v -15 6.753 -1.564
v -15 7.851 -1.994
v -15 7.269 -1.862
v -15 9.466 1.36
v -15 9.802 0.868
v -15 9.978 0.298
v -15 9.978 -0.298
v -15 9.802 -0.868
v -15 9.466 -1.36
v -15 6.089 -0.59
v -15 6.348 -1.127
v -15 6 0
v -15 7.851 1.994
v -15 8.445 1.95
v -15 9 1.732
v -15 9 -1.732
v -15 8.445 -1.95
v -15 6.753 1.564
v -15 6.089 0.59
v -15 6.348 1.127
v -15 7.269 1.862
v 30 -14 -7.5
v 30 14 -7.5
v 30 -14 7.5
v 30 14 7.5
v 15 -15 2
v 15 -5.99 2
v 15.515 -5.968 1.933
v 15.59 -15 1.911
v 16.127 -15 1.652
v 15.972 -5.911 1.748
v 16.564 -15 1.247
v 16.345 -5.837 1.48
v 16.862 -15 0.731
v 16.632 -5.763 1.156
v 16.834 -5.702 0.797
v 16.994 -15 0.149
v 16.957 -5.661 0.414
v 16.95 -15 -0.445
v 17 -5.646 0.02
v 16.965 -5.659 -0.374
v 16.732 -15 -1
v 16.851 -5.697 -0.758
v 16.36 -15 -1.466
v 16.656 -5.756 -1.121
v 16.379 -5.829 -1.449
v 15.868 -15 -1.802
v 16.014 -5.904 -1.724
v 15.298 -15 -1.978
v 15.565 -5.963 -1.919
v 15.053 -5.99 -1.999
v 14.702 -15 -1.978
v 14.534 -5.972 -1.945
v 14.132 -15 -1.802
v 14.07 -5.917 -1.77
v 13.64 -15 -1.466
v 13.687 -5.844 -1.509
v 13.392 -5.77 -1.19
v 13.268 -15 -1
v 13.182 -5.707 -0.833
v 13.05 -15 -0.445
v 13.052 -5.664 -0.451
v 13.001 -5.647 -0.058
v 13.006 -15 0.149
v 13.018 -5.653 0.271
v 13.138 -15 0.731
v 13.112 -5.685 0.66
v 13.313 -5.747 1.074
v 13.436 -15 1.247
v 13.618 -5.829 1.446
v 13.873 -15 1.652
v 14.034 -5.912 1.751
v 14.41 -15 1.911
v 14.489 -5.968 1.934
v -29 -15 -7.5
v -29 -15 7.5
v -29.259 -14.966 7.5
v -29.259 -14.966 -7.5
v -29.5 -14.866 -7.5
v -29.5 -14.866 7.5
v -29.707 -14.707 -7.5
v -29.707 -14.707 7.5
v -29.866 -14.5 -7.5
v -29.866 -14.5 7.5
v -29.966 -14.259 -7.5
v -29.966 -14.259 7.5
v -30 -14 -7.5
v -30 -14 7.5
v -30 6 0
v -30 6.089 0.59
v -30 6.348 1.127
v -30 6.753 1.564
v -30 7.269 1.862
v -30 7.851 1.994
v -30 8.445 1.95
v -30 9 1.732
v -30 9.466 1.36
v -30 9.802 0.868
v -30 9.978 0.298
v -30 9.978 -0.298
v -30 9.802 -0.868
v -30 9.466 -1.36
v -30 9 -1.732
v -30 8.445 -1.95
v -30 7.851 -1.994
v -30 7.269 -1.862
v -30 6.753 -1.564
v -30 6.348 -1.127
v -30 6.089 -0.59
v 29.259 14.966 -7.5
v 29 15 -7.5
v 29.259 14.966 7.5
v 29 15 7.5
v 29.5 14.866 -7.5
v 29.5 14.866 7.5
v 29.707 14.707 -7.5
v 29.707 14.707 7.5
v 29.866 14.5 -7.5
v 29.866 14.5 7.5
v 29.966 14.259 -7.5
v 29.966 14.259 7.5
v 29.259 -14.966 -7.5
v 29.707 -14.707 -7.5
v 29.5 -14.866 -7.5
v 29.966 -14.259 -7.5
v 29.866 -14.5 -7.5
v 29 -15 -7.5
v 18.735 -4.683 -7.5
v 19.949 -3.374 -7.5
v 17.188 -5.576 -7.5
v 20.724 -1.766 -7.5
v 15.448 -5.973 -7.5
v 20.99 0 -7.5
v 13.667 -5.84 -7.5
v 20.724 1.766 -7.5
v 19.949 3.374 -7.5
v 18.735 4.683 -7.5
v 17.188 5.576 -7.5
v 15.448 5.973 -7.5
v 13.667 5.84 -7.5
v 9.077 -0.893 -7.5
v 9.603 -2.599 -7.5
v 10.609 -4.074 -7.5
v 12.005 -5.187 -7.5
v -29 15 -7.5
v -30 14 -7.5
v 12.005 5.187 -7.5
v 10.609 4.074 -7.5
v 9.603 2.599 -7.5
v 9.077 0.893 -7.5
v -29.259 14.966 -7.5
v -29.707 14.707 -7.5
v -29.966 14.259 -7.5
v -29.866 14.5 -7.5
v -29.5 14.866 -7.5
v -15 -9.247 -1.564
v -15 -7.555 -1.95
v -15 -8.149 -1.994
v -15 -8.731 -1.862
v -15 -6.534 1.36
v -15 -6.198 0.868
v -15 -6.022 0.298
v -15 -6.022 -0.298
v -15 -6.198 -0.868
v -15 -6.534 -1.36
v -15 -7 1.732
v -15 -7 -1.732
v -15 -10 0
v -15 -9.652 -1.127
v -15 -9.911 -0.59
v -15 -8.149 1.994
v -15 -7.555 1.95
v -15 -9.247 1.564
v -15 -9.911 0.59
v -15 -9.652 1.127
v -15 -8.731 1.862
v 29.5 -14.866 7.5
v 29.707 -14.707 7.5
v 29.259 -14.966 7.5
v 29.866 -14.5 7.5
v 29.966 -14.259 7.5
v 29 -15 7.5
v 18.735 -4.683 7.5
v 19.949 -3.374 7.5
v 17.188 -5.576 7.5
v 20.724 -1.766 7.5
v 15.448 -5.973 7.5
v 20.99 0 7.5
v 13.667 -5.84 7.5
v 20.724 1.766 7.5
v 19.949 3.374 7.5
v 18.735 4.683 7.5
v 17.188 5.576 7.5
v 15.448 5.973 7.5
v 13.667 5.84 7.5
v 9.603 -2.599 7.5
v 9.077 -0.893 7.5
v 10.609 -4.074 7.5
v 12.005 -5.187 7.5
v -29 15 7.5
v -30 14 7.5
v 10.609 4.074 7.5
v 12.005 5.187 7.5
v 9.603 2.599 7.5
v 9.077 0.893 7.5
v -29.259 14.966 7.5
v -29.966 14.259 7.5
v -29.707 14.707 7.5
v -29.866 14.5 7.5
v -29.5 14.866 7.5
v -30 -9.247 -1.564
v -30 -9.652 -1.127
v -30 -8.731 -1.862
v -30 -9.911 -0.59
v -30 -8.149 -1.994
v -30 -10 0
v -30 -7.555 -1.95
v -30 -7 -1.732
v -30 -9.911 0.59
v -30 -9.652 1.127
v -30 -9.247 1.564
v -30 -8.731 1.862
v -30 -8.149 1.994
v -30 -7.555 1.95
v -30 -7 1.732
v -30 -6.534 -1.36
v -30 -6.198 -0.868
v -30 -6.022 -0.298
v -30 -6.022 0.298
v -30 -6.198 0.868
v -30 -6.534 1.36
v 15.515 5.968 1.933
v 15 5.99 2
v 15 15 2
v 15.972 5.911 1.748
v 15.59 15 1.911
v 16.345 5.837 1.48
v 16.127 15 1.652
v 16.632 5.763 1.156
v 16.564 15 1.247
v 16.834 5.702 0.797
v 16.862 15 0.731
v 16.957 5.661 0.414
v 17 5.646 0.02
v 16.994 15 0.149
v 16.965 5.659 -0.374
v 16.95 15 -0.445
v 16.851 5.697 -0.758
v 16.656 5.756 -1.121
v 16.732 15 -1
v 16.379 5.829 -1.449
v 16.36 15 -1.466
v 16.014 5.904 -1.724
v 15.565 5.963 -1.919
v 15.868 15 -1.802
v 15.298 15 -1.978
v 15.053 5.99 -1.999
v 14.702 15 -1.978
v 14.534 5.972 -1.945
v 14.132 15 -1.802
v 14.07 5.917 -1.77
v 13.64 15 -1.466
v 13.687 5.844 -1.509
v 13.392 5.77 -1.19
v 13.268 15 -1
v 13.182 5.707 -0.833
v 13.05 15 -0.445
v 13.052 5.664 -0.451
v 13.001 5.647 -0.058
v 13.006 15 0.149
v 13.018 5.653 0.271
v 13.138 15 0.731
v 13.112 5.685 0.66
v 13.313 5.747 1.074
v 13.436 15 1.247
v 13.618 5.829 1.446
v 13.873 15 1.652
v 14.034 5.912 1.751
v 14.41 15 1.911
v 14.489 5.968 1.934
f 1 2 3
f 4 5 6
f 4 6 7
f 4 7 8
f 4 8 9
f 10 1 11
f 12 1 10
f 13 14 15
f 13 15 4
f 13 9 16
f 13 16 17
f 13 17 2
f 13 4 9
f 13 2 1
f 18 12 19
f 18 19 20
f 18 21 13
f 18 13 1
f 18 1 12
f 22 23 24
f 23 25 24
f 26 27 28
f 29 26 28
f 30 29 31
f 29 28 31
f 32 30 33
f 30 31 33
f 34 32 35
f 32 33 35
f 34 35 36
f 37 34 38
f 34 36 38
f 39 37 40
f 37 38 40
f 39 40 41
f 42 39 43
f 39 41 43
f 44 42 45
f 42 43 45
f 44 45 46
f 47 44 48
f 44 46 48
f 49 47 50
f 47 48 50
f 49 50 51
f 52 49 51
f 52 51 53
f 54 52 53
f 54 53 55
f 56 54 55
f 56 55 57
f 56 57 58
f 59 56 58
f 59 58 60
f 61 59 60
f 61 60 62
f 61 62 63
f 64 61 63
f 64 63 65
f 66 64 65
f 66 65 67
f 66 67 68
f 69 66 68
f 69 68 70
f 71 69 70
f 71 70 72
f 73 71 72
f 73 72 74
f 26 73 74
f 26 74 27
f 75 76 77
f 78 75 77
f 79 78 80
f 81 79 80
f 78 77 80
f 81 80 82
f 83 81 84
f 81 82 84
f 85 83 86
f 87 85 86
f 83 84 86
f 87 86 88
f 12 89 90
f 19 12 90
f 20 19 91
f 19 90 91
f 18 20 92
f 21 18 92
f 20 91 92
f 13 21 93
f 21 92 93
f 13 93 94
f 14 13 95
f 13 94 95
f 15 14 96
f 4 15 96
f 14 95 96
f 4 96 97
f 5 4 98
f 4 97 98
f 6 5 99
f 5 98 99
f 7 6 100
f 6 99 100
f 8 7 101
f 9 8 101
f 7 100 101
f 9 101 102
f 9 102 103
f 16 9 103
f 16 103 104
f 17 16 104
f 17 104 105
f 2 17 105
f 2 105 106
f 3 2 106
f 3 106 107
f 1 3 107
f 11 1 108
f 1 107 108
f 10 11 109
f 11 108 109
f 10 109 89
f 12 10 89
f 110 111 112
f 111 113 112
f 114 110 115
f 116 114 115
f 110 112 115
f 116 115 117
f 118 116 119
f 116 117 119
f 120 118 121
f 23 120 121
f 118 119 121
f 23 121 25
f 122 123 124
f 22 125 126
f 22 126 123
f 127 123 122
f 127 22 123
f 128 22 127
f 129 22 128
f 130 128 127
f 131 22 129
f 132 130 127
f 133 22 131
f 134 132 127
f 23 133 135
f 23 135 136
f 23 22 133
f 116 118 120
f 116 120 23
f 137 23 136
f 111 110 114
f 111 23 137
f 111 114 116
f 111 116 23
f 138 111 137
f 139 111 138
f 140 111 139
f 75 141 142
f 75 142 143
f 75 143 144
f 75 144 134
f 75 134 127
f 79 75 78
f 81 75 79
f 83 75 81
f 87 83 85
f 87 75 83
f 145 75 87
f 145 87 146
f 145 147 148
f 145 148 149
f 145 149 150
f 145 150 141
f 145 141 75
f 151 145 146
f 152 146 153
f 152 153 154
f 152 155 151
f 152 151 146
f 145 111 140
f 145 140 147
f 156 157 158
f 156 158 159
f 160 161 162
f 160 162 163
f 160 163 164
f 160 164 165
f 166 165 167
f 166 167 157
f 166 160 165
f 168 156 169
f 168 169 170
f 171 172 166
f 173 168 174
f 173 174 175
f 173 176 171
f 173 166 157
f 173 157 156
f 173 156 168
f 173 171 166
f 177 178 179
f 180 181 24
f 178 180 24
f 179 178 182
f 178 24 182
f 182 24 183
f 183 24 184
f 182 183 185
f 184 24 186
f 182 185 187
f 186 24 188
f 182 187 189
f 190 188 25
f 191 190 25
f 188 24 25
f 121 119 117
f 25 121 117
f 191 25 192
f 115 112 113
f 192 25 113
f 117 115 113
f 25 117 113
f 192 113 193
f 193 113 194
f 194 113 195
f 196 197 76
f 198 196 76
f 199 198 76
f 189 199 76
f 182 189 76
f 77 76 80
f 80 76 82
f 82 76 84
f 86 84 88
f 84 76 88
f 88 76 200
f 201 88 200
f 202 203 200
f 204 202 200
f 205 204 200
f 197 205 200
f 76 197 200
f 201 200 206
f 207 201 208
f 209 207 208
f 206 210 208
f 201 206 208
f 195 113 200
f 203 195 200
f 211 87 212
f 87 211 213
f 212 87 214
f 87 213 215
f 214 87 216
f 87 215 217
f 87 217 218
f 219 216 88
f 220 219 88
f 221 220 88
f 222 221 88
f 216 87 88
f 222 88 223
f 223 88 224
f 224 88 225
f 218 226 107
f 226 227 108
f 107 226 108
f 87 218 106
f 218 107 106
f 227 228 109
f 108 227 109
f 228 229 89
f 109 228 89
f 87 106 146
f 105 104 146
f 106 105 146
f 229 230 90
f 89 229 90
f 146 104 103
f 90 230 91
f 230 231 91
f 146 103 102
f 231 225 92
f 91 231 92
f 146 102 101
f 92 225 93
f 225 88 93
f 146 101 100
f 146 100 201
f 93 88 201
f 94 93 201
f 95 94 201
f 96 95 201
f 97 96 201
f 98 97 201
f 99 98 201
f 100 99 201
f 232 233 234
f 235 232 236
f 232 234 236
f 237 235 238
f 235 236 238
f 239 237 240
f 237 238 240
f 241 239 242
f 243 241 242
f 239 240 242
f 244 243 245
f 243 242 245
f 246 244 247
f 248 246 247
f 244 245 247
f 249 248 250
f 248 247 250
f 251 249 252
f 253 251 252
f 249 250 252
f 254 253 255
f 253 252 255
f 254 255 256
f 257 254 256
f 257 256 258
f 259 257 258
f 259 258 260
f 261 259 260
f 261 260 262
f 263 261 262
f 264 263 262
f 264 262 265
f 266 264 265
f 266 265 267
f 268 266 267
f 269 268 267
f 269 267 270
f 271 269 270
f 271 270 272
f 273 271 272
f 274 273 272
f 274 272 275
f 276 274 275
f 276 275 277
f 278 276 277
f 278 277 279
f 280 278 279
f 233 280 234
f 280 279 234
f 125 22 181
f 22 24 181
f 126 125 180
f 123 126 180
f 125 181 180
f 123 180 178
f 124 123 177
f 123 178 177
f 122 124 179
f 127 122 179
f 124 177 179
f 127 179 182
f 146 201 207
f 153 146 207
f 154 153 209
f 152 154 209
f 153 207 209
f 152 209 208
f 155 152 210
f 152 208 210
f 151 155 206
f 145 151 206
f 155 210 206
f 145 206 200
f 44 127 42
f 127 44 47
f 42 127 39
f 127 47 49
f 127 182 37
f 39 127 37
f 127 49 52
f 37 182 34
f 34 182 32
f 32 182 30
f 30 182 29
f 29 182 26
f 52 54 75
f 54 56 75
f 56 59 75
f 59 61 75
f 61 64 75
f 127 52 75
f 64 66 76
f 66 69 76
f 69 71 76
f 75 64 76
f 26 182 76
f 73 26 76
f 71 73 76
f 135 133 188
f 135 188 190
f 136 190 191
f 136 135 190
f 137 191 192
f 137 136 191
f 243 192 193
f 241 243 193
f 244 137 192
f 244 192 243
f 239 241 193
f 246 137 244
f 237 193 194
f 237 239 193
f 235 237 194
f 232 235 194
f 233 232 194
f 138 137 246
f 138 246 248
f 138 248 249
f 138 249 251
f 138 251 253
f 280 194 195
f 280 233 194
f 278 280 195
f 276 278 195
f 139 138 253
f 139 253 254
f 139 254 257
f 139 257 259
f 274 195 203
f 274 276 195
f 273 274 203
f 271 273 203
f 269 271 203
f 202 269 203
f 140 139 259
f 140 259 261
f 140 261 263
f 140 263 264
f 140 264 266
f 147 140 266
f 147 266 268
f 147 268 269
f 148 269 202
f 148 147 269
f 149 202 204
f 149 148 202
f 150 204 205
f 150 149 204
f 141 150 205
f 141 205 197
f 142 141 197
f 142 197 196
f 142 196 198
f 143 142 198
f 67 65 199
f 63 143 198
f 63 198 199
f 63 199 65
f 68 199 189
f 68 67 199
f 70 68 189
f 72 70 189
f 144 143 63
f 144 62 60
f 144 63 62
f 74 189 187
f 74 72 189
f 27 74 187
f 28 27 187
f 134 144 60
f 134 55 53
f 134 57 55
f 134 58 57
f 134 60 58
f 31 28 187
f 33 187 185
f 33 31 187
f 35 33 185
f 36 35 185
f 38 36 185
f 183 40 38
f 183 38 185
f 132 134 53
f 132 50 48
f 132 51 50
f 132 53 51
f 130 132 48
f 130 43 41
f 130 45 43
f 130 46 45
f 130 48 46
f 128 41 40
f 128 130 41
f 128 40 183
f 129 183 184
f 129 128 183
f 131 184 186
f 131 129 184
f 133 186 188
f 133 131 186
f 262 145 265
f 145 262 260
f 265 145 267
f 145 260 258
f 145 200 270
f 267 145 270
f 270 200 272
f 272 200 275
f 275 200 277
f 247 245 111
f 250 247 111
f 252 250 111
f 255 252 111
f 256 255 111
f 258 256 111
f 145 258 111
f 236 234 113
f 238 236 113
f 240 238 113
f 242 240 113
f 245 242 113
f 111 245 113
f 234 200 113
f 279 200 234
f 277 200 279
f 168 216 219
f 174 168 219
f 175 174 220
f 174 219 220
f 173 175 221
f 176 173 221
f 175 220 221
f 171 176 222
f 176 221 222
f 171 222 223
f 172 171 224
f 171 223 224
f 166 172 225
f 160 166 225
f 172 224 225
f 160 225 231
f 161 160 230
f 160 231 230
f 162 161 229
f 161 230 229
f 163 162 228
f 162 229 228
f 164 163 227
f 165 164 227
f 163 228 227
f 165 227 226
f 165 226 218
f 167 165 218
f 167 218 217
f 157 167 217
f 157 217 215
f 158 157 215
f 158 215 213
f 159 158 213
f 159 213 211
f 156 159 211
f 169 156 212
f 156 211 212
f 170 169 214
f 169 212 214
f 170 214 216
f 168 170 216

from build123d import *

# Parameters (mm, degrees)
SKETCH1_R           = 5.99
BOSS_EXTRUDE1_DEPTH = 7.5
SKETCH2_R           = 2
CUT_EXTRUDE1_DEPTH  = 15
SKETCH3_R           = 2
CUT_EXTRUDE5_DEPTH  = 35


with BuildPart() as part:
    # Sketch1 → Boss-Extrude1 (new, symmetric)
    with BuildSketch(Plane.XY):
        with BuildLine():
            Line((-29, 15), (29, 15))
            ThreePointArc((29, 15), (29.707106781, 14.707106781), (30, 14))
            Line((30, 14), (30, -14))
            ThreePointArc((30, -14), (29.707106781, -14.707106781), (29, -15))
            Line((29, -15), (-29, -15))
            ThreePointArc((-29, -15), (-29.707106781, -14.707106781), (-30, -14))
            Line((-30, -14), (-30, 14))
            ThreePointArc((-30, 14), (-29.707106781, 14.707106781), (-29, 15))
        make_face()
        with Locations((15, 0)):
            Circle(SKETCH1_R, mode=Mode.SUBTRACT)
    extrude(amount=BOSS_EXTRUDE1_DEPTH, both=True)

    # Sketch2 → Cut-Extrude1 (cut)
    with BuildSketch(Plane.ZY.offset(30)):
        with Locations(Location((0, 8, 0), (0, 0, 270))):
            Circle(SKETCH2_R)
        with Locations(Location((0, -8, 0), (0, 0, 270))):
            Circle(SKETCH2_R)
    extrude(amount=-CUT_EXTRUDE1_DEPTH, mode=Mode.SUBTRACT)

    # Sketch3 → Cut-Extrude5 (cut)
    with BuildSketch(Plane(origin=(0, 15, 0), x_dir=(1, 0, 0), z_dir=(0, 1, 0))):
        with Locations(Location((15, 0, 0), (0, 0, 270))):
            Circle(SKETCH3_R)
    extrude(amount=-CUT_EXTRUDE5_DEPTH, mode=Mode.SUBTRACT)


solid = part.part
